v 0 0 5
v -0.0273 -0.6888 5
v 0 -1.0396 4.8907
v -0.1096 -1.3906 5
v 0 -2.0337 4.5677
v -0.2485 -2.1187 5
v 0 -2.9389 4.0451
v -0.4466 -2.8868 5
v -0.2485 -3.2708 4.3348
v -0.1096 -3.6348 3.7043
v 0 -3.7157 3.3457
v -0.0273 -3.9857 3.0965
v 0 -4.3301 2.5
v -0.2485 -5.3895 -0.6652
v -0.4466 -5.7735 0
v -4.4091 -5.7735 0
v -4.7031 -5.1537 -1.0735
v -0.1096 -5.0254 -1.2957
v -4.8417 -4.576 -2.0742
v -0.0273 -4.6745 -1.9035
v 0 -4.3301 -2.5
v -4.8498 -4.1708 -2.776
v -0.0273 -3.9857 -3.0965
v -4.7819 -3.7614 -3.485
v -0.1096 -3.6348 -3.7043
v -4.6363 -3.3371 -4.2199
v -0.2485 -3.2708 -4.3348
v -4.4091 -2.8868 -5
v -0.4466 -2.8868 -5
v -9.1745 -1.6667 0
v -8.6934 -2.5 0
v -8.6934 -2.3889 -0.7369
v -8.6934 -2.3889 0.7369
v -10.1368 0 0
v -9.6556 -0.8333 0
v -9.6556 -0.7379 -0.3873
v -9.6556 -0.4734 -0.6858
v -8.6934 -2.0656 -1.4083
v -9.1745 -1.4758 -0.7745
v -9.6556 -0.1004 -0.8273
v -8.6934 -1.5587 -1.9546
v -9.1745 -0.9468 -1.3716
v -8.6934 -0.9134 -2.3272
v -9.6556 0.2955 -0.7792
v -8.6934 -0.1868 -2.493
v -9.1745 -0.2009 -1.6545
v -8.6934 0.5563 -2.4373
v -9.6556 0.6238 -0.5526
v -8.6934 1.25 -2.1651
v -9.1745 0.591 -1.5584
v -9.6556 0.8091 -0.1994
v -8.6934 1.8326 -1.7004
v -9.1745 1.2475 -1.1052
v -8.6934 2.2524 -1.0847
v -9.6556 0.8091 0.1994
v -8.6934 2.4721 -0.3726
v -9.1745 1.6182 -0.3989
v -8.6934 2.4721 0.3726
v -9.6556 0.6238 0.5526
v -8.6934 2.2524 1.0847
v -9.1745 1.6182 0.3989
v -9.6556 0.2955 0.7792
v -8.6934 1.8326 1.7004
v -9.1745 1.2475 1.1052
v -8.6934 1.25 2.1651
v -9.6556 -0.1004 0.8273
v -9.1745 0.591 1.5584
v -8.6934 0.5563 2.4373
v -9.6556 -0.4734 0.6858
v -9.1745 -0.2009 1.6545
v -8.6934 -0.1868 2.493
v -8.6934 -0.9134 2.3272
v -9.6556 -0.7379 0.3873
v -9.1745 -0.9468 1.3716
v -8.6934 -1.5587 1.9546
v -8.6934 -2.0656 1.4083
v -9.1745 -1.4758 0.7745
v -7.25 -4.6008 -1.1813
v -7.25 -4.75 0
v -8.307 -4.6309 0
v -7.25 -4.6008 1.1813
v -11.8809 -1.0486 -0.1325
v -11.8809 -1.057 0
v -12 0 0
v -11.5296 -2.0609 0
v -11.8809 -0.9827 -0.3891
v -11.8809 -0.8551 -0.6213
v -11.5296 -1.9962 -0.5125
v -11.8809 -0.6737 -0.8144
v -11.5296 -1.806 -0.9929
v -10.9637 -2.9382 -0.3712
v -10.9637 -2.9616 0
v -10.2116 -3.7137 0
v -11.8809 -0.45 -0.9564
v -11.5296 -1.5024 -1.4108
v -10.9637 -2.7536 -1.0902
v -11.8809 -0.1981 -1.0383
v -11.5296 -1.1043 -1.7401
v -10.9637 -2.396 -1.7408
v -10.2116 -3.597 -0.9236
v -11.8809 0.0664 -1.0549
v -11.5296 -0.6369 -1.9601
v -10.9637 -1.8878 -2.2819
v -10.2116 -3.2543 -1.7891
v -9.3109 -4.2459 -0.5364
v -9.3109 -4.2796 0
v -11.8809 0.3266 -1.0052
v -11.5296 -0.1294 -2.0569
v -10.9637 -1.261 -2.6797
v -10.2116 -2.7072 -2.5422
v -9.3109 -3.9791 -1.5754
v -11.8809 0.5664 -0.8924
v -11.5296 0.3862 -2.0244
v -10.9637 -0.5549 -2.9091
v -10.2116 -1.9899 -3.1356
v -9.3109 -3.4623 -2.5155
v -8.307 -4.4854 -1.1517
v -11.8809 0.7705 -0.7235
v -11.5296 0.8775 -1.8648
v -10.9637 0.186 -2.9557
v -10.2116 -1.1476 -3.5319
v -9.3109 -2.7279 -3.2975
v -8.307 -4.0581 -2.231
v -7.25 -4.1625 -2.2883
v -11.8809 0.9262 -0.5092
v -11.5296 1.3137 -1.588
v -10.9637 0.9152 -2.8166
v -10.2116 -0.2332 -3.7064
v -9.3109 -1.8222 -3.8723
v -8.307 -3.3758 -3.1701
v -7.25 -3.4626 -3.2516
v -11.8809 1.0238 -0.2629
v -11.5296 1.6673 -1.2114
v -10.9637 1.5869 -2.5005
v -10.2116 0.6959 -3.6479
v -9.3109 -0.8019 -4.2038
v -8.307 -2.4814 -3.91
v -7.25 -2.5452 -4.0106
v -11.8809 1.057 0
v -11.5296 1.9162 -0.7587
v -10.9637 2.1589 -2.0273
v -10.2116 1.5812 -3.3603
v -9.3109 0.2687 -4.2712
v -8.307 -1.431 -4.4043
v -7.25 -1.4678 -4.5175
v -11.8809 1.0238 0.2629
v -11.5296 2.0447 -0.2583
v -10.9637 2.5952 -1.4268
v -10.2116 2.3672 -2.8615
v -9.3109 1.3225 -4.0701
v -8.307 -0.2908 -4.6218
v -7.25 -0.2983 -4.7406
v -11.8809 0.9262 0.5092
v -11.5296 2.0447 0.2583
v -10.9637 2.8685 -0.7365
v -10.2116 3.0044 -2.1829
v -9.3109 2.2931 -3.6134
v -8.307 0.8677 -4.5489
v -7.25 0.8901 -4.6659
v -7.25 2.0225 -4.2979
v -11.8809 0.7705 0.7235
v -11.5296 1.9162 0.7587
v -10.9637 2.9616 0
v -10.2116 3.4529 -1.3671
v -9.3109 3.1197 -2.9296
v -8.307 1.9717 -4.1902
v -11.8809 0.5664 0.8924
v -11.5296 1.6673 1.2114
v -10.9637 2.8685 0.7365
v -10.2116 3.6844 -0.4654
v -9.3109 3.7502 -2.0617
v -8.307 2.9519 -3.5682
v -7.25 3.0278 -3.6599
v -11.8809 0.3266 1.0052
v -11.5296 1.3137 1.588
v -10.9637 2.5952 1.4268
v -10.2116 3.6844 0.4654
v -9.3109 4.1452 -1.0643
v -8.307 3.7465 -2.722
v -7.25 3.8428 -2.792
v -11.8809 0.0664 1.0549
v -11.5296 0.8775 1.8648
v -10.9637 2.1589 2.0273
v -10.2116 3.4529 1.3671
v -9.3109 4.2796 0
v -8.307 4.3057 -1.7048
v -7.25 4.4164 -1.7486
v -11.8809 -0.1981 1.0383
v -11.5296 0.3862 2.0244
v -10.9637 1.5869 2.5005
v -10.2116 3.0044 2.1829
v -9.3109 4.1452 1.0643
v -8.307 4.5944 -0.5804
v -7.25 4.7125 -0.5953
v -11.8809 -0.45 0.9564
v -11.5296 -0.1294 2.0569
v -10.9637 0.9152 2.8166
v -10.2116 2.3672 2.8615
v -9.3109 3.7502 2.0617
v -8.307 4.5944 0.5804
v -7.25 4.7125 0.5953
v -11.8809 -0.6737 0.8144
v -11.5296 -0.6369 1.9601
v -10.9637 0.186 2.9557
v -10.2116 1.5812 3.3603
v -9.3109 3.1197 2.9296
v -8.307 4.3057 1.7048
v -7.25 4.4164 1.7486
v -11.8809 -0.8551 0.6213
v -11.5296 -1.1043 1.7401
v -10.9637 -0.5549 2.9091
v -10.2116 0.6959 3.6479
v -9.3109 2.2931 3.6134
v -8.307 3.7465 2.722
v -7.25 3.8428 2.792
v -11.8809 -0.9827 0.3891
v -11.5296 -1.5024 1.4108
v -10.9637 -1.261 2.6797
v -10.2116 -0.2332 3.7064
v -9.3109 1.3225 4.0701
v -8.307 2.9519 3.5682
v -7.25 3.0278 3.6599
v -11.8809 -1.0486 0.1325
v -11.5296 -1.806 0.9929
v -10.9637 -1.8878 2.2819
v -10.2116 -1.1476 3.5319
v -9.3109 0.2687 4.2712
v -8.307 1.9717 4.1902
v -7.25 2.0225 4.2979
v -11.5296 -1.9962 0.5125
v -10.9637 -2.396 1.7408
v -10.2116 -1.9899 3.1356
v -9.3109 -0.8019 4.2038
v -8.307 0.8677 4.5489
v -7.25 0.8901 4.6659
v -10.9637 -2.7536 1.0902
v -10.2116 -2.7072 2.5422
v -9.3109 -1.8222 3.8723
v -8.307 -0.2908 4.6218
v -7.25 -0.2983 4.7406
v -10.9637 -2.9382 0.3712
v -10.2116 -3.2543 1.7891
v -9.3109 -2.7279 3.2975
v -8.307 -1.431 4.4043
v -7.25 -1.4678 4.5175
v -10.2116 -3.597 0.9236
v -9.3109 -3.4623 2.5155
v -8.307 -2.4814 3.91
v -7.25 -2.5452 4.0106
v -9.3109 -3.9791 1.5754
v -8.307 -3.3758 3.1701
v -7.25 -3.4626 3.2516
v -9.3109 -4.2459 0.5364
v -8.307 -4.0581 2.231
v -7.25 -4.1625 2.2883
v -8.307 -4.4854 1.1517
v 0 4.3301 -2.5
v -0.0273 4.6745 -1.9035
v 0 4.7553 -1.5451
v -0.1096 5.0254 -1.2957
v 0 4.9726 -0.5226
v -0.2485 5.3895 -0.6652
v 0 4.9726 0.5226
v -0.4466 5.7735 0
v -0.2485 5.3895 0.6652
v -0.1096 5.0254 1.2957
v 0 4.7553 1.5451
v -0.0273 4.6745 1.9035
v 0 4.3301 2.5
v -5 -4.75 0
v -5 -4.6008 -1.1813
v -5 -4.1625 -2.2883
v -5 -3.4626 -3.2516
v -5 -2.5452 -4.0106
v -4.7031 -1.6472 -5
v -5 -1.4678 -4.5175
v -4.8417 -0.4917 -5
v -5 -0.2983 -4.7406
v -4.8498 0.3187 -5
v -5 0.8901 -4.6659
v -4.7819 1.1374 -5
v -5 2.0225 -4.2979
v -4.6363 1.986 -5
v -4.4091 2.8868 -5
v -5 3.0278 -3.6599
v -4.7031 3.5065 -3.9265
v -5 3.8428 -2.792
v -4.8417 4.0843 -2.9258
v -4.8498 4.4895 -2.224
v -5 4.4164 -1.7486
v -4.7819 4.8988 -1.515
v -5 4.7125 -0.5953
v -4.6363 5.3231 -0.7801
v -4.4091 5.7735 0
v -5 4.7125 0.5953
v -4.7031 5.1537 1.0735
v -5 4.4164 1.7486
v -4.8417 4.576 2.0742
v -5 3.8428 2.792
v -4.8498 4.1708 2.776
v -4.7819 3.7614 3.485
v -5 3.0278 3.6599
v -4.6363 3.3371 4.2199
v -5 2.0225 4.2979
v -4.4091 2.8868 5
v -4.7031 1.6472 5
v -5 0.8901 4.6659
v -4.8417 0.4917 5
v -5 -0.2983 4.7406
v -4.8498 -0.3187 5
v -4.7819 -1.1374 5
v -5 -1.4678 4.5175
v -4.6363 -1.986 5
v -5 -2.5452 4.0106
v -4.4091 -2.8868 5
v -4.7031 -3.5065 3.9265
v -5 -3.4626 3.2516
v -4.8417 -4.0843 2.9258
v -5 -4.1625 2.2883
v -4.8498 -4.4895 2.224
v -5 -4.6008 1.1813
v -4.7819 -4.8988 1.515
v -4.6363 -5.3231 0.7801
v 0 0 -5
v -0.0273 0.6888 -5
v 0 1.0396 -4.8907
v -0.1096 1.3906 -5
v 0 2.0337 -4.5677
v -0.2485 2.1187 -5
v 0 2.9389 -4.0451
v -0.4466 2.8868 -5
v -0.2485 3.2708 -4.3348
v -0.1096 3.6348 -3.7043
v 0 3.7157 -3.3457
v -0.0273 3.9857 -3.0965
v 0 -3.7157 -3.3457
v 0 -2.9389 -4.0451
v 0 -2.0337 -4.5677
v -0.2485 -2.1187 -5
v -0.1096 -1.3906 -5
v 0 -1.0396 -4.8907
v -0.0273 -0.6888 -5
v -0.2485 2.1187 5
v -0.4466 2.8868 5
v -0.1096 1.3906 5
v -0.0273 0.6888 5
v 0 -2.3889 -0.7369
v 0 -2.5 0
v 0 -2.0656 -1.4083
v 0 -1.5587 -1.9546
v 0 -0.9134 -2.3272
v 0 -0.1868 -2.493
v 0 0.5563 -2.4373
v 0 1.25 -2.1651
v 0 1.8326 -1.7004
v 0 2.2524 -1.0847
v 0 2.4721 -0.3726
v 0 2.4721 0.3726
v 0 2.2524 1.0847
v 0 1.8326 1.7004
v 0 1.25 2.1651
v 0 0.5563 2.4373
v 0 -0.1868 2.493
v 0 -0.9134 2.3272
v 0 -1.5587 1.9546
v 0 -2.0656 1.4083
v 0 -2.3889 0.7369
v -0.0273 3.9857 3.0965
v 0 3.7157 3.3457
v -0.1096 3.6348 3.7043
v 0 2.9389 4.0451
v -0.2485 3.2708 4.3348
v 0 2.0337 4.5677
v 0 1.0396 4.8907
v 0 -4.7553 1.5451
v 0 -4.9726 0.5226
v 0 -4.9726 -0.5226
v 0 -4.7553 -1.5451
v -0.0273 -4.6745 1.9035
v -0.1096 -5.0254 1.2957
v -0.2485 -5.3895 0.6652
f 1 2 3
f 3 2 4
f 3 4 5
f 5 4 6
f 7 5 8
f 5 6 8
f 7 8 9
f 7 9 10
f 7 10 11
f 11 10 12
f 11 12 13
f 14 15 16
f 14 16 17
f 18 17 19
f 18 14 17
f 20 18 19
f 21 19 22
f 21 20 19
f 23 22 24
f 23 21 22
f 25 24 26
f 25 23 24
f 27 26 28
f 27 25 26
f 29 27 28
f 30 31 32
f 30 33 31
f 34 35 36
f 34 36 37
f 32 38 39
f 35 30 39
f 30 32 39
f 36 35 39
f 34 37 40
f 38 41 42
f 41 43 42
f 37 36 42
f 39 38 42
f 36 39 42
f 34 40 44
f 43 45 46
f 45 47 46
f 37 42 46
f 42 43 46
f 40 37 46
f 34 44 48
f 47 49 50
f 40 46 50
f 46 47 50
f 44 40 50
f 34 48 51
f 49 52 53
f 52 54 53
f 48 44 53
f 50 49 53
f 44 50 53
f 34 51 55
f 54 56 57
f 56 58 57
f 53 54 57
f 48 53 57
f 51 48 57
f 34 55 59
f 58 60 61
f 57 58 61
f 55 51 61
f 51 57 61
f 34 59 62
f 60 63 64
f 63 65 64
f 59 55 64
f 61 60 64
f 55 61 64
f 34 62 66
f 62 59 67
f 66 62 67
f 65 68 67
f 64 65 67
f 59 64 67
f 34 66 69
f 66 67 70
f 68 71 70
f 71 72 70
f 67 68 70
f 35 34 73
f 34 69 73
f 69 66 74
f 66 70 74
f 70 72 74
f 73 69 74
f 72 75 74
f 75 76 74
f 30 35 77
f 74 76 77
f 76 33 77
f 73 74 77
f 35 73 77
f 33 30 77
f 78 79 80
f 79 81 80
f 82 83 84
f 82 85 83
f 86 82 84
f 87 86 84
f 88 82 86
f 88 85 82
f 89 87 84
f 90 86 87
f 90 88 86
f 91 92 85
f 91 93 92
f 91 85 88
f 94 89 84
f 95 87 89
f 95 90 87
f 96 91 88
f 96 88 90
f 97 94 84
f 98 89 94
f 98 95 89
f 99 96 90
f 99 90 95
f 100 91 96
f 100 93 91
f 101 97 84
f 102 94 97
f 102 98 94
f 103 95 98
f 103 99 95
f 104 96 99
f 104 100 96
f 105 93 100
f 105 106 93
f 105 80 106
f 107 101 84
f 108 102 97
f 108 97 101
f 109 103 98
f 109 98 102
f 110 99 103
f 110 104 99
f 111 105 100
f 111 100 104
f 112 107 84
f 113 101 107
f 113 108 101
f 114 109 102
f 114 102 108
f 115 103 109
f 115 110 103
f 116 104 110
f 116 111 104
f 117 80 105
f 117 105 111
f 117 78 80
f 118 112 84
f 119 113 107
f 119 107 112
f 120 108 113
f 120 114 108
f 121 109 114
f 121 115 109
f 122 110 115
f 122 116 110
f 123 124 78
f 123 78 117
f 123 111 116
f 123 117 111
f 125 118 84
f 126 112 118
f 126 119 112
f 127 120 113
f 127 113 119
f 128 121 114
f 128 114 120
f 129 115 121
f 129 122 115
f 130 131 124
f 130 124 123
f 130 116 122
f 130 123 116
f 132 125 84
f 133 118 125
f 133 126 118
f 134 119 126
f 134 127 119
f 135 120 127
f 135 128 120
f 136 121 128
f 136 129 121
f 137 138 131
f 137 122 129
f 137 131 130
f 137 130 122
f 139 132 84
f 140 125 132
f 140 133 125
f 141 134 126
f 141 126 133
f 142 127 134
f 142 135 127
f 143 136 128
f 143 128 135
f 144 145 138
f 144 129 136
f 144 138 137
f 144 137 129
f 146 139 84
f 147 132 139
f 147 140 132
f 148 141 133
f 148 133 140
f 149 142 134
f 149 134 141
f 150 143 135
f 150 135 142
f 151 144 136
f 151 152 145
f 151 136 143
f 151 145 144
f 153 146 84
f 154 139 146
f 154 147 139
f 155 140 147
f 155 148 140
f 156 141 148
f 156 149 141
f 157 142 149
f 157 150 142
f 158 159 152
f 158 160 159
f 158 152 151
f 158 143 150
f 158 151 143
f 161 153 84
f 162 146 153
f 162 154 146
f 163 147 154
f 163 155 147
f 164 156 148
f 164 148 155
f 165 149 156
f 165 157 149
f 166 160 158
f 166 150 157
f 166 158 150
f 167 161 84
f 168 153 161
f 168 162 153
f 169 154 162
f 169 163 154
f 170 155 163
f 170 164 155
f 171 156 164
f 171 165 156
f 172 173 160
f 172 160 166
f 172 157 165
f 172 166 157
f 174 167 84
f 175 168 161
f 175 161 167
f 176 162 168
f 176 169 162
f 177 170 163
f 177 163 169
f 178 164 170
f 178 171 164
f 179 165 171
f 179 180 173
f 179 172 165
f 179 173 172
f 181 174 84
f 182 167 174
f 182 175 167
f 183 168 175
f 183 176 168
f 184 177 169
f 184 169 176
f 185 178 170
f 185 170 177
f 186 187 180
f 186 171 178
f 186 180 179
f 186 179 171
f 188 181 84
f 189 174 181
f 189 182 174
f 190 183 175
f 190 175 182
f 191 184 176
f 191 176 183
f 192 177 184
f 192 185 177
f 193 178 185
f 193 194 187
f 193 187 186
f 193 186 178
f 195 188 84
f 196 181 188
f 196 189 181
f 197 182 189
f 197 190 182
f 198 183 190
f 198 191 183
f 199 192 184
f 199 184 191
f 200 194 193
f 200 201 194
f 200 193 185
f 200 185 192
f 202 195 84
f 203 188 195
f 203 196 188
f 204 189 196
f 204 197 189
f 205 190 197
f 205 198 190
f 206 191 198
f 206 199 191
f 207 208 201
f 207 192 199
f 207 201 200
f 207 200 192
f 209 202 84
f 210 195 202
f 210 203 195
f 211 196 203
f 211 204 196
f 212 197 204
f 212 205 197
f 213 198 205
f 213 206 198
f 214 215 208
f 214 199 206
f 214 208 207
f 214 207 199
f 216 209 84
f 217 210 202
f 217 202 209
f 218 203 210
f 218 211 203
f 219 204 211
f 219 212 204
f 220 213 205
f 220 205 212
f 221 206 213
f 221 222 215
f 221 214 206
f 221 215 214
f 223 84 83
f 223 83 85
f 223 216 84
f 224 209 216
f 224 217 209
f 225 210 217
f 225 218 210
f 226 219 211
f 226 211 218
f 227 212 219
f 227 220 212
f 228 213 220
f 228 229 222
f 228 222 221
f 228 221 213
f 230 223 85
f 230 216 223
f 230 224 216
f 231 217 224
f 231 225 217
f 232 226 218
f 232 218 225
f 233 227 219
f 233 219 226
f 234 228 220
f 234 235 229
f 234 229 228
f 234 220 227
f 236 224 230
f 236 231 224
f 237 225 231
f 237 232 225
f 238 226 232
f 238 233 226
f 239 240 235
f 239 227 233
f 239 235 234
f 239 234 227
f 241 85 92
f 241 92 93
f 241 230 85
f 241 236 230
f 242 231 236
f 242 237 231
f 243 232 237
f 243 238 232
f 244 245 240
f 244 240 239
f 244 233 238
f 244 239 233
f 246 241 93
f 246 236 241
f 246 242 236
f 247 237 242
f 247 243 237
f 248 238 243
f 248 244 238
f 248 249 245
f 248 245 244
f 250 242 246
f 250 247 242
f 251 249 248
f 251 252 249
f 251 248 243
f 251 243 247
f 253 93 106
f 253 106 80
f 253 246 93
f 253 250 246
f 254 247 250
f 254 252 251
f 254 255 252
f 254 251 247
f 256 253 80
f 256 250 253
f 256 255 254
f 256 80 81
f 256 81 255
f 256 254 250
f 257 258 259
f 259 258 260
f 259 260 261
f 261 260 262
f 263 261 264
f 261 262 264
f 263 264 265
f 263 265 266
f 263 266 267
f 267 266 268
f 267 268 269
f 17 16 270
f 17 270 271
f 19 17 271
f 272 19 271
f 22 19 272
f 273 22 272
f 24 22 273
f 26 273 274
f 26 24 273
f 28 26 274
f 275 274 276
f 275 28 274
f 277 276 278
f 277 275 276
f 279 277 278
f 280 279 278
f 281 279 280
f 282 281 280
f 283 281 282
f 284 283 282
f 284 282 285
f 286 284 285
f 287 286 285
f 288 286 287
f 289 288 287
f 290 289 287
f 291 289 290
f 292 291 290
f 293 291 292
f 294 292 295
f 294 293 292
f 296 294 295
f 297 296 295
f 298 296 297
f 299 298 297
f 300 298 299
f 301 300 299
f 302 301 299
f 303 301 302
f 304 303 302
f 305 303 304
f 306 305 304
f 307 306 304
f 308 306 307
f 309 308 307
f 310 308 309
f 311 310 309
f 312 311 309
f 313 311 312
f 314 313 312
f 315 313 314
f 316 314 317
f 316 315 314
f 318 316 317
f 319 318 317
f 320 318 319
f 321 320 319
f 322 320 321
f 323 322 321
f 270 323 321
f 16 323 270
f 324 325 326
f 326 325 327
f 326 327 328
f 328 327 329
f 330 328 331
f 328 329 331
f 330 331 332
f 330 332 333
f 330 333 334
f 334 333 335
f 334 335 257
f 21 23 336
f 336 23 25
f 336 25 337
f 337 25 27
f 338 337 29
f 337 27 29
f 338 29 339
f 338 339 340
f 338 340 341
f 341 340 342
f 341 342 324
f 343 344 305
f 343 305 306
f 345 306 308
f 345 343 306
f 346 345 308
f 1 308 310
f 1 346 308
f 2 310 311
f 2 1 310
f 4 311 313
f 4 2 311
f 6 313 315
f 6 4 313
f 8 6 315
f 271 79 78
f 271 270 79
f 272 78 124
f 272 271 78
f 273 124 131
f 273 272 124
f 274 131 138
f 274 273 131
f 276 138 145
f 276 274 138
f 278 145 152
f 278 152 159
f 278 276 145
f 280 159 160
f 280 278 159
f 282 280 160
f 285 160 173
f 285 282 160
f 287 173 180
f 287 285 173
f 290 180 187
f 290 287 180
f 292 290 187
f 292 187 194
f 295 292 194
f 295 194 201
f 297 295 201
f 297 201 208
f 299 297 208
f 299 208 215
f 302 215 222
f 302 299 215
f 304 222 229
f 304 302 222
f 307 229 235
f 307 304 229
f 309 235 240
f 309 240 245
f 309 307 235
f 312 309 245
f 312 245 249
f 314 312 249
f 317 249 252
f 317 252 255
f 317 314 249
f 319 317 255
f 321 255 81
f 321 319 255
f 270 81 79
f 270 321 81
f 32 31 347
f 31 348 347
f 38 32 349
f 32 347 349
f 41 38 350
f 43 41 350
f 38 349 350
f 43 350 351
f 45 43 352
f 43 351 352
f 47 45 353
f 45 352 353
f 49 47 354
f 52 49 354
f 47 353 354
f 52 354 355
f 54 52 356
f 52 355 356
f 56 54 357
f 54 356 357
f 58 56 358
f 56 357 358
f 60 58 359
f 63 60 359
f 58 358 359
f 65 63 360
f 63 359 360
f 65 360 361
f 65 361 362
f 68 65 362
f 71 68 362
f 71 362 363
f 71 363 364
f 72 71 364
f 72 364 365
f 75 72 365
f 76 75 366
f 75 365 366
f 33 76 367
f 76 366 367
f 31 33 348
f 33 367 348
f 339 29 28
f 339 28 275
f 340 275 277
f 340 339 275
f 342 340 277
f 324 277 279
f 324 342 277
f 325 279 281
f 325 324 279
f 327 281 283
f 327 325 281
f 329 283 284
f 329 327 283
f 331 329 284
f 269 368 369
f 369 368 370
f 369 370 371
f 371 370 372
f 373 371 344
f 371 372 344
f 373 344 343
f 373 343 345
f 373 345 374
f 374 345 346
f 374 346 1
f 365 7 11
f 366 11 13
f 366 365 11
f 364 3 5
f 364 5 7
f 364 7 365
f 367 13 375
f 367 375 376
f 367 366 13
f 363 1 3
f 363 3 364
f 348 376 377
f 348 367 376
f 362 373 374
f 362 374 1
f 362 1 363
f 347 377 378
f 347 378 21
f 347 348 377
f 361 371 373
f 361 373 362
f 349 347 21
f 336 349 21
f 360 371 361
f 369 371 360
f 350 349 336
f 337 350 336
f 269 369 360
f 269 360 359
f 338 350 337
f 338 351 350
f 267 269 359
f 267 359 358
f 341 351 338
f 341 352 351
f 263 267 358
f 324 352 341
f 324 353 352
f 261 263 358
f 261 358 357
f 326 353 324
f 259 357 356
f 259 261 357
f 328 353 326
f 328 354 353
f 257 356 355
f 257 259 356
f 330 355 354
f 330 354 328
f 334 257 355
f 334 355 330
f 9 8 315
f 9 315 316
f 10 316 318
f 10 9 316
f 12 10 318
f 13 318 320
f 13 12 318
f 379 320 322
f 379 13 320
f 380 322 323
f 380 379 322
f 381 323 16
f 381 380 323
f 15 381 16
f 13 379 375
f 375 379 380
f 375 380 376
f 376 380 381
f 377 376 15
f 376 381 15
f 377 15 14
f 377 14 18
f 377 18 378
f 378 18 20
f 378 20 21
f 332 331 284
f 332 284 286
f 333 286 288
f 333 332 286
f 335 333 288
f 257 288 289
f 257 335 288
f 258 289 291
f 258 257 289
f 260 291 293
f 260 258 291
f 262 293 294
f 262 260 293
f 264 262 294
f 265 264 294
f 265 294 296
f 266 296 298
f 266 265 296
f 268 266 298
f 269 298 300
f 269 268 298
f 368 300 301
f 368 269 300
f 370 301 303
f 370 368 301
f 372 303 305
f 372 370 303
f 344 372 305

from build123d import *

# Parameters (mm, degrees)
BOSS_EXTRUDE1_DEPTH = 12


with BuildPart() as part:
    # Sketch1 → Boss-Extrude1 (new body)
    with BuildSketch(Plane(origin=(0, 0, 0), x_dir=(0, 0, -1), z_dir=(1, 0, 0))):
        Polygon((0, 5.773502692), (-5, 2.886751346), (-5, -2.886751346), (0, -5.773502692), (5, -2.886751346), (5, 2.886751346), align=None)
    extrude(amount=-BOSS_EXTRUDE1_DEPTH)

    # Sketch2 → Cut-Revolve4 (revolve, cut)
    with BuildSketch(Plane.XY):
        Polygon((0, 5), (-0.446581987, 5.773502692), (0, 5.773502692), align=None)
        with BuildLine():
            Line((-4.409080445, 5.773502692), (-13.863248654, 5.773502692))
            Line((-13.863248654, 5.773502692), (-13.863248654, 0))
            Line((-13.863248654, 0), (-12, 0))
            ThreePointArc((-12, 0), (-10.608757211, 3.358757211), (-7.25, 4.75))
            Line((-7.25, 4.75), (-5, 4.75))
            Line((-5, 4.75), (-4.409080445, 5.773502692))
        make_face()
        Polygon((-10.136751346, 0), (-8.693375673, 2.5), (0, 2.5), (0, 0), align=None)
    revolve(axis=Axis((-12, 0, 0), (1, 0, 0)), mode=Mode.SUBTRACT)


solid = part.part
